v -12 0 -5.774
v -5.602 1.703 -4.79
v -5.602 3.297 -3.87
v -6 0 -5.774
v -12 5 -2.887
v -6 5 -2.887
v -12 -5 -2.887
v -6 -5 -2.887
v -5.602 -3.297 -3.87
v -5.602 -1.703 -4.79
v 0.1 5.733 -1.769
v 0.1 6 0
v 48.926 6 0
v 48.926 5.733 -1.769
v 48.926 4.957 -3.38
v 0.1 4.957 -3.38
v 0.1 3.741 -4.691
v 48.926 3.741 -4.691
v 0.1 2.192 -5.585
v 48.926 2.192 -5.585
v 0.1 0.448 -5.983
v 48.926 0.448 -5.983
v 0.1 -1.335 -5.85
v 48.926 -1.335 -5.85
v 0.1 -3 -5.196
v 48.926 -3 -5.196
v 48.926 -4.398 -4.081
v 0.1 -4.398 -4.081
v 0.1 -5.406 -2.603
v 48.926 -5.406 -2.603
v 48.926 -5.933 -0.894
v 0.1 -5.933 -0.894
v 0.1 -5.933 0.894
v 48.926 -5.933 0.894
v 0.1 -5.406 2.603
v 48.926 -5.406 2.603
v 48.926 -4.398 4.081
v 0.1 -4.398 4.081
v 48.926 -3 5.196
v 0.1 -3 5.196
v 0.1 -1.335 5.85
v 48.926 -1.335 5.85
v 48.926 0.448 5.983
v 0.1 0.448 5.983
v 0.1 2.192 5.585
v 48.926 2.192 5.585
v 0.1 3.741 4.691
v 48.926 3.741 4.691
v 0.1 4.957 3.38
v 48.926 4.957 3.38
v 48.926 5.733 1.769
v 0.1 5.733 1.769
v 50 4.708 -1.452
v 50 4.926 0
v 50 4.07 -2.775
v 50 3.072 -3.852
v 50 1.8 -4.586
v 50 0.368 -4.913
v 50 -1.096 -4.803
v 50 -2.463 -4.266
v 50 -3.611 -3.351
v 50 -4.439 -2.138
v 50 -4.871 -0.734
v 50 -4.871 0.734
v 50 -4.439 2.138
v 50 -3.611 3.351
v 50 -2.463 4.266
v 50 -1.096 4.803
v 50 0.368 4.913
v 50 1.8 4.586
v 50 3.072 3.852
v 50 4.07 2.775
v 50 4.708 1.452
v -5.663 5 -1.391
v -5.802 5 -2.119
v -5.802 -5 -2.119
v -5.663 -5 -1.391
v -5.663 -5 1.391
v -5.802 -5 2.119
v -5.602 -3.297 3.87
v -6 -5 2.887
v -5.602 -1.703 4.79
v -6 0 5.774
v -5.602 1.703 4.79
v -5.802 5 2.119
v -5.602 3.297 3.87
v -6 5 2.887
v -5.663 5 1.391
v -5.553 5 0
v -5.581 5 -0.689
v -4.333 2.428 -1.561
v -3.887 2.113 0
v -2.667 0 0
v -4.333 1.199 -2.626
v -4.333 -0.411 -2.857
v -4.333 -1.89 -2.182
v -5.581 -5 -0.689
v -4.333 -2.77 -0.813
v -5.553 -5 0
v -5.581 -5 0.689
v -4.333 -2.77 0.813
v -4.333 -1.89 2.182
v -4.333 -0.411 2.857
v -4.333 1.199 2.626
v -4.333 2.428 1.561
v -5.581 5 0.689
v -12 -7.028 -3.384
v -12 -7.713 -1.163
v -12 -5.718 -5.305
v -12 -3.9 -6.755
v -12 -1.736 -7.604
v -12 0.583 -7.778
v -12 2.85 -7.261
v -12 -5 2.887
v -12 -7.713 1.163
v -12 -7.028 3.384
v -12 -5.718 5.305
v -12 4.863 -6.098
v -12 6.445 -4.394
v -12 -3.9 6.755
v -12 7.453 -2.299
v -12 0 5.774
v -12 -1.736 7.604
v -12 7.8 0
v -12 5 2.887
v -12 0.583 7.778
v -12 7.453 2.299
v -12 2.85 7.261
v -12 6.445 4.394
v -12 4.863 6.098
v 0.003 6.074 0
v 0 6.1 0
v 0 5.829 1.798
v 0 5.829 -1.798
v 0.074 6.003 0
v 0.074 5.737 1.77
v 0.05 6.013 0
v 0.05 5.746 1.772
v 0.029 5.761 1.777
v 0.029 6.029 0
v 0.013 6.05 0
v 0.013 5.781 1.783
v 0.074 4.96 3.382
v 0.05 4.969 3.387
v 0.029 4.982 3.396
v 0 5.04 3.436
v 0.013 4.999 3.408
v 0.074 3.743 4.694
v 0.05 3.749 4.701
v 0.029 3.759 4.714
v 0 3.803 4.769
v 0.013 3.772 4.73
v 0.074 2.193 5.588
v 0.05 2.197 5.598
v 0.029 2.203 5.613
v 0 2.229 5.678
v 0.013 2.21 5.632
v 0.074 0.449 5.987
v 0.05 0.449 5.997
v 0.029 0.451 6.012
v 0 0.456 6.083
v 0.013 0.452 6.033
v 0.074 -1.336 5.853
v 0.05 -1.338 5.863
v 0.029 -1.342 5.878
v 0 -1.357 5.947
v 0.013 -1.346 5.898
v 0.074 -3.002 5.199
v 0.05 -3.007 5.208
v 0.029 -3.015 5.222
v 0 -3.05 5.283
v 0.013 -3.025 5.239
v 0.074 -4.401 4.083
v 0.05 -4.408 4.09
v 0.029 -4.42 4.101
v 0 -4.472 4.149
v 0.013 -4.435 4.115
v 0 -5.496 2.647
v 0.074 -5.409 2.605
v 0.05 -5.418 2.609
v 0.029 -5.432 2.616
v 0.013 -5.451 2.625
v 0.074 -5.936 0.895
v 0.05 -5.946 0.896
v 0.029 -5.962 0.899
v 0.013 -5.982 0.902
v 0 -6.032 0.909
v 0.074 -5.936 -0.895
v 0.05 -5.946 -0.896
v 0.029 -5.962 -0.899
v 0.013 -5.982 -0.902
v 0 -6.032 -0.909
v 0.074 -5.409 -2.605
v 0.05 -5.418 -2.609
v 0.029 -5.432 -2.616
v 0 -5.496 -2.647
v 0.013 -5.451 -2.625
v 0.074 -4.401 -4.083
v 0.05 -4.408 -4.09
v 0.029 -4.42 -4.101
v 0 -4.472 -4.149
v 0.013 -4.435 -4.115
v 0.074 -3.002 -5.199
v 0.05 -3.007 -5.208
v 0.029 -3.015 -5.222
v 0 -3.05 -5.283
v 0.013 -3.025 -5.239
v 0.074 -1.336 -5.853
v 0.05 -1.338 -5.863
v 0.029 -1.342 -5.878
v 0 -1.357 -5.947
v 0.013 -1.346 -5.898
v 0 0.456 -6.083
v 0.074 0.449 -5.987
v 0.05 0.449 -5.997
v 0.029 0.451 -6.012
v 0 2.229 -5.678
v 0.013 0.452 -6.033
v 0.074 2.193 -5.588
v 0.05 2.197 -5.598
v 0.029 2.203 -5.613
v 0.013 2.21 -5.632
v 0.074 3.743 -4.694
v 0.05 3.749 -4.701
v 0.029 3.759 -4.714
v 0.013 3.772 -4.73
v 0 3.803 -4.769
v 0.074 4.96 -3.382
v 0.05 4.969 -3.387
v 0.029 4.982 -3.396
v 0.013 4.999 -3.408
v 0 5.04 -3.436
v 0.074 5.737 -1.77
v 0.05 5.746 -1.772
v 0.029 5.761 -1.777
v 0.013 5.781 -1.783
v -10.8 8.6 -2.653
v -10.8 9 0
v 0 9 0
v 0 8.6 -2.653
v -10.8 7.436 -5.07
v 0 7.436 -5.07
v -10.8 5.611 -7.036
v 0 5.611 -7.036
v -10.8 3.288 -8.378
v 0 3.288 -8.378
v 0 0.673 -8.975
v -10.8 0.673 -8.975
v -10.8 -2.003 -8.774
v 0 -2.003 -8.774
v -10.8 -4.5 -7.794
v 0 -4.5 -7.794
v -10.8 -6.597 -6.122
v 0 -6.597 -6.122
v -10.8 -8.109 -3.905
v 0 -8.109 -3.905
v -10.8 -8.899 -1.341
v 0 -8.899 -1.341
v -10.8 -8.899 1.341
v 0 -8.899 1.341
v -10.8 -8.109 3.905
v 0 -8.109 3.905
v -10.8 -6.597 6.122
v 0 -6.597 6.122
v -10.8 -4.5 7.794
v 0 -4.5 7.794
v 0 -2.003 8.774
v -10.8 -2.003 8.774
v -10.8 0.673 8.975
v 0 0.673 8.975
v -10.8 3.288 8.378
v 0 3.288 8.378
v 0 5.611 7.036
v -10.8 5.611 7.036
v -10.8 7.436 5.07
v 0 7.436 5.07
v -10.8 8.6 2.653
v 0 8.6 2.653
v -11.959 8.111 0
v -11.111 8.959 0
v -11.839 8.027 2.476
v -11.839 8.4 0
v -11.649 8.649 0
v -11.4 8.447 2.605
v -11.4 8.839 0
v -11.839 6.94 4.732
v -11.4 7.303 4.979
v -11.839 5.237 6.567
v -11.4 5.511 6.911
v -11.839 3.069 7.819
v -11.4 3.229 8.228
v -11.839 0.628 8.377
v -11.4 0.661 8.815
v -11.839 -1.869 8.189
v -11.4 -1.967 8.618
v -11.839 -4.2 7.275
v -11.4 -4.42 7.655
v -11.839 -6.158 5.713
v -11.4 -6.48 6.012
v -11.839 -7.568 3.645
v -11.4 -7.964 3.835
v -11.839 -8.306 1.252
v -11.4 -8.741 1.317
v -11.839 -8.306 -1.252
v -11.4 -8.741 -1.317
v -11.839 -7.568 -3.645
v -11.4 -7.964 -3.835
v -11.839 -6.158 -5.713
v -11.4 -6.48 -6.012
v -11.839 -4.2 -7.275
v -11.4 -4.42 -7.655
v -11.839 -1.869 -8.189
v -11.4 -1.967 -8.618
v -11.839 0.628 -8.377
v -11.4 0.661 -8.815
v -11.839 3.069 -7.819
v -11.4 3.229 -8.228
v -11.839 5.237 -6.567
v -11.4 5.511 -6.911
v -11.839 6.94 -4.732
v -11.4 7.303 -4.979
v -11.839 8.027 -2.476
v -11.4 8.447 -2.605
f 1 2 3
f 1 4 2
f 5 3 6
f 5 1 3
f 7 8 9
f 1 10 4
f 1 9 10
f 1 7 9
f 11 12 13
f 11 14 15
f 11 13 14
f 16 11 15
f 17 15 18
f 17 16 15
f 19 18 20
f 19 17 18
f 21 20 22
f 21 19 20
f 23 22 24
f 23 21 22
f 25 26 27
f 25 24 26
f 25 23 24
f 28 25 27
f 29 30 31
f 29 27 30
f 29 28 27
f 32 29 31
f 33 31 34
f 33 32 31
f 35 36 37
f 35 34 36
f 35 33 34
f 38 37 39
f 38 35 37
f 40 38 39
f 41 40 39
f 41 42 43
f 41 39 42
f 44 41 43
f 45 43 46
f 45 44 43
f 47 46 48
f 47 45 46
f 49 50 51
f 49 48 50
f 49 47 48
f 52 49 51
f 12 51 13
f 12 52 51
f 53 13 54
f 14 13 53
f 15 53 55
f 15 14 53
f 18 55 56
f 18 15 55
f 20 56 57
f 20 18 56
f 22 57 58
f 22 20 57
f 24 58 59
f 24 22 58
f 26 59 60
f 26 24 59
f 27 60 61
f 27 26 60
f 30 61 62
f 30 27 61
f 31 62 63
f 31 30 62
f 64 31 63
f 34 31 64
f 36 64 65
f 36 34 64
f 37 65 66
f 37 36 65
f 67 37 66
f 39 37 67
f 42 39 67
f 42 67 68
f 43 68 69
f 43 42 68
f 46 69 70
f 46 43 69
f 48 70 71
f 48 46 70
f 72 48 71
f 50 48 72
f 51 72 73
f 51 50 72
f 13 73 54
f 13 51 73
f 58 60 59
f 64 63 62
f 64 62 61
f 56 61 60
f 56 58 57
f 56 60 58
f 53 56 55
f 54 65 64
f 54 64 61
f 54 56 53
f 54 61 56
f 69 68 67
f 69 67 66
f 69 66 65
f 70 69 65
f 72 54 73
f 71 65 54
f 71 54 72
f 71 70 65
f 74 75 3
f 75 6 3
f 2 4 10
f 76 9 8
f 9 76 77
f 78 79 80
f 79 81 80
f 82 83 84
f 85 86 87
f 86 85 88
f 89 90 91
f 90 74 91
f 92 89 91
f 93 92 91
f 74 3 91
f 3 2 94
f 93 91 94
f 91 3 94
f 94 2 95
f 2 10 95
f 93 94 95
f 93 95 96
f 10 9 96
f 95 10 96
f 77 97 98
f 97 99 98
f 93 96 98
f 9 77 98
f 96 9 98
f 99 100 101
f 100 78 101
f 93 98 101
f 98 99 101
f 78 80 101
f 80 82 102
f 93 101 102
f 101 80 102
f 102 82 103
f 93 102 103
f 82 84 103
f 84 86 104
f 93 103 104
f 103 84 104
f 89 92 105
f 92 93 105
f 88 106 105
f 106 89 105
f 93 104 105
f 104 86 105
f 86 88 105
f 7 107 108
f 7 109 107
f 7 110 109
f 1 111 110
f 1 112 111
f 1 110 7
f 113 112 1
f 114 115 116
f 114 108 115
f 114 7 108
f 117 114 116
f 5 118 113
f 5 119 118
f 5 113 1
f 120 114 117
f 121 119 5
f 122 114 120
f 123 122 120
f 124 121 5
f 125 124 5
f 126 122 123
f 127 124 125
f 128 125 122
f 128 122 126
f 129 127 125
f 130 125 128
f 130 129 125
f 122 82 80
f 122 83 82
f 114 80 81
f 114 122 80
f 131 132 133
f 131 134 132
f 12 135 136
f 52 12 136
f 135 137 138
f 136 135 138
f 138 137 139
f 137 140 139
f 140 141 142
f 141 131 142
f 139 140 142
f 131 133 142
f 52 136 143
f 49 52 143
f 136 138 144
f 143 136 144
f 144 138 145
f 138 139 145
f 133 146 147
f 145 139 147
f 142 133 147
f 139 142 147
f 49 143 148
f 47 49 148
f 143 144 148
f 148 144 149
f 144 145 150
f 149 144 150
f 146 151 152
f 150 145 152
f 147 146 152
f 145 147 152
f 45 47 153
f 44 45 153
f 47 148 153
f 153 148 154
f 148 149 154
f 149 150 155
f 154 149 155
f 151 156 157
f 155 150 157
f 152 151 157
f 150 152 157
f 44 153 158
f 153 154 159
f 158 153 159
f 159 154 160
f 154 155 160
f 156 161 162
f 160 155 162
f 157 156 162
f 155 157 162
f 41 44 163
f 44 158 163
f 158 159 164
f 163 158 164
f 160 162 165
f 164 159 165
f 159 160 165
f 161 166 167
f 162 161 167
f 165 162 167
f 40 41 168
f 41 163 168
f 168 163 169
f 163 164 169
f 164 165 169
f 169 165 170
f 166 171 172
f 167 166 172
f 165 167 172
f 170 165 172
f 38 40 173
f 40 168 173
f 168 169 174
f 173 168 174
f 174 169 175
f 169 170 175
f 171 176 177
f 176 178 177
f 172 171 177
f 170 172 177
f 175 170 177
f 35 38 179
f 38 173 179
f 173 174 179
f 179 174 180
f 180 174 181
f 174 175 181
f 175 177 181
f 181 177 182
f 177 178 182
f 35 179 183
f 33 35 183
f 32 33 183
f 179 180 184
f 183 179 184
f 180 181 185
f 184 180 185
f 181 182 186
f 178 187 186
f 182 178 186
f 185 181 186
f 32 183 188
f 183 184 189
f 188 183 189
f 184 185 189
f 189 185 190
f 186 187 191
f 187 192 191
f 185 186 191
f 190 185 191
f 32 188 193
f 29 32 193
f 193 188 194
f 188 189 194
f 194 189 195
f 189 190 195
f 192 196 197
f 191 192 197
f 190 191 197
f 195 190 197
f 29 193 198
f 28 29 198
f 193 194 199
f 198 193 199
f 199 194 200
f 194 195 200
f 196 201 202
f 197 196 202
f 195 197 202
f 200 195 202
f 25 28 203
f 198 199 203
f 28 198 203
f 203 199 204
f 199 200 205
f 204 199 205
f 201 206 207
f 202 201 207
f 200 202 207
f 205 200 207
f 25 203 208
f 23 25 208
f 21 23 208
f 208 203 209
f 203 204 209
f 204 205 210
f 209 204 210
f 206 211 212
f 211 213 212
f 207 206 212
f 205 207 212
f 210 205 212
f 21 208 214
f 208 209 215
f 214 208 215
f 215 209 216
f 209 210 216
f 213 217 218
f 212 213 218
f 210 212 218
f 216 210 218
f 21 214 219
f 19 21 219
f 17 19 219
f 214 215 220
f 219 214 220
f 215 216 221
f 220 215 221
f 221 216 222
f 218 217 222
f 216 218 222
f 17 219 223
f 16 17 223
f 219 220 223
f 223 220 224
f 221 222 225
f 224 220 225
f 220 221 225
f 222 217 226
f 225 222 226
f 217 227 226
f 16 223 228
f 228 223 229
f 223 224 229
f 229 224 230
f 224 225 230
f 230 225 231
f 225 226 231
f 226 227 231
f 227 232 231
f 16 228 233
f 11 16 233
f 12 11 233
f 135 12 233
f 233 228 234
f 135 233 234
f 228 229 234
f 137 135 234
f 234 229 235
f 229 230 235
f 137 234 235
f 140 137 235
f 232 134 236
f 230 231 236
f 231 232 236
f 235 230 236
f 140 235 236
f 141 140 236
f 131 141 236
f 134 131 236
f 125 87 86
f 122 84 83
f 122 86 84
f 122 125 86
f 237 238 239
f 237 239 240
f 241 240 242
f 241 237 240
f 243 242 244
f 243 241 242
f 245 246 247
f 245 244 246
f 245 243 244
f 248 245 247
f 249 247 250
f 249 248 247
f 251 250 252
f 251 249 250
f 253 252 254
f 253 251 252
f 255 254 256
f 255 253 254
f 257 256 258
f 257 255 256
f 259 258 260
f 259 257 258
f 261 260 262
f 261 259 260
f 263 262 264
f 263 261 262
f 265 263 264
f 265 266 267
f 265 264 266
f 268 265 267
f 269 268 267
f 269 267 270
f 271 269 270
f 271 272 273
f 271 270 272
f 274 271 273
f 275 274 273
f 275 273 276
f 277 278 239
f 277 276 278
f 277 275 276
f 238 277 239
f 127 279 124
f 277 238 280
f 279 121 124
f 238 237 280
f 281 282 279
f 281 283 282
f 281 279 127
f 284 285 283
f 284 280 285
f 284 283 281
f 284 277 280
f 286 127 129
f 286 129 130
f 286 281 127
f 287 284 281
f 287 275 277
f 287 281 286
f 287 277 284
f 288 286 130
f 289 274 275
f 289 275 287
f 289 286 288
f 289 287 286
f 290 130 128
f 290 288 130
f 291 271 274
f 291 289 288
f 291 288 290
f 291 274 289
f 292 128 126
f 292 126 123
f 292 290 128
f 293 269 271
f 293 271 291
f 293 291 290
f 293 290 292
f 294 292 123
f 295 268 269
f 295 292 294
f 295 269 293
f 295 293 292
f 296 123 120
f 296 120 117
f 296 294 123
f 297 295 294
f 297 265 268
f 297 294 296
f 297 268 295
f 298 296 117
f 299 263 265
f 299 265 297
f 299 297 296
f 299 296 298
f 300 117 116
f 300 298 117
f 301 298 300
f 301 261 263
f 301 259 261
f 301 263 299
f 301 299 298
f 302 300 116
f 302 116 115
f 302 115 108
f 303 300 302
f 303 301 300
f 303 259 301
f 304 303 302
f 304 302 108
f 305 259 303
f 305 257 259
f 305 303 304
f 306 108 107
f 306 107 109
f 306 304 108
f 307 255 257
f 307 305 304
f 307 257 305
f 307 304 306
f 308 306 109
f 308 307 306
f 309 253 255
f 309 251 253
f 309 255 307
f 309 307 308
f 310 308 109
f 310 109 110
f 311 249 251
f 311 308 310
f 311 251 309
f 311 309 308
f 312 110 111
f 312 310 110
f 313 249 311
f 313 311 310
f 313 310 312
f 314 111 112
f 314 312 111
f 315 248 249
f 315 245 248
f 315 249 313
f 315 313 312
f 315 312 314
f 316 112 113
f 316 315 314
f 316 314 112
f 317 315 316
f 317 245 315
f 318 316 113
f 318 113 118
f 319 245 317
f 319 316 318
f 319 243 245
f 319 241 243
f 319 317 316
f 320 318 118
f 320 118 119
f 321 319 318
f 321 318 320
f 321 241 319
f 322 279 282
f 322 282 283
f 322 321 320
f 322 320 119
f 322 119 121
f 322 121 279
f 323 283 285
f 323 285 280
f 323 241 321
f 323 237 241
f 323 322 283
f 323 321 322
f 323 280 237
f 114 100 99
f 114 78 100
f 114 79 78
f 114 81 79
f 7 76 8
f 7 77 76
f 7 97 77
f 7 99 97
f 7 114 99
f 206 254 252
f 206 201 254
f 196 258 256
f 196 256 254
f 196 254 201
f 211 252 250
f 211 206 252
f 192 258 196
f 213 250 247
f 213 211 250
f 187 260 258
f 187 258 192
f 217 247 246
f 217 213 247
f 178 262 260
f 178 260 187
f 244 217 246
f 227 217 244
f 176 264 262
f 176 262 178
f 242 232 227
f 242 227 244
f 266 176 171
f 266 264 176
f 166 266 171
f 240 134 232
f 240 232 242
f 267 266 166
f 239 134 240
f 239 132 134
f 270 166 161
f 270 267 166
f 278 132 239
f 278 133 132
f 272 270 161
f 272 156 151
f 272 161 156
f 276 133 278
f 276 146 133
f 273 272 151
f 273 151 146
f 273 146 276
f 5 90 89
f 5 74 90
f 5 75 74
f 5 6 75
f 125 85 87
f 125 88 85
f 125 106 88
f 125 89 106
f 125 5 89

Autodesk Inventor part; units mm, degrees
ref_plane "YZ Plane" through (0, 0, 0) normal (1, 0, 0) x (0, 1, 0)
ref_plane "XZ Plane" through (0, 0, 0) normal (0, 1, 0) x (-1, 0, 0)
sketch "Skizze1" plane through (0, 0, 0) normal (0, 0, 1) x (1, 0, 0)
  line L0 (-2.6667, 0) -> (50, 0)
  line L1 (50, 0) -> (50, 6)
  line L2 (50, 6) -> (4.375, 6)
  line L3 (4.375, 6) -> (3.3014, 6)
  line L4 (3.3014, 6) -> (0, 6)
  line L5 (0, 6) -> (0, 9)
  line L6 (0, 9) -> (-12, 9)
  line L7 (-12, 9) -> (-12, 5.7735)
  line L8 (-12, 5.7735) -> (-6, 5.7735)
  line L9 (-6, 5.7735) -> (-2.6667, 0)
  line L10 (-24.4, 0) -> (62.4, 0) projected
  line L11 (0, -1.8) -> (0, 10.8) projected
  line L12 (4.375, 6) -> (0, 6) construction
  dimension "d1" = 45.625
  dimension "d2" = 1.0736
  dimension "d3" = 12
  dimension "d4" = 6
  dimension "d5" = 60
  dimension "d6" = 12
  dimension "d7" = 12
  dimension "d8" = 11.547
  dimension "d9" = 18
  dimension "d26" = 50
revolve "Körper" add sketch "Skizze1" angle 360 about axis through (-2.6667, 0, 0) along (1, 0, 0)
sketch "Skizze2" plane through (-12, 0, 0) normal (-1, 0, 0) x (0, 0, 1)
  circle A0 centre (0, 0) radius 5.7735 projected
  line L0 (0, -12.6) -> (0, 12.6) projected
  line L1 (-12.6, 0) -> (12.6, 0) projected
  line L2 (5.7735, 0) -> (2.8868, -5)
  line L3 (2.8868, -5) -> (-2.8868, -5)
  line L4 (-2.8868, -5) -> (-5.7735, 0)
  line L5 (-5.7735, 0) -> (-2.8868, 5)
  line L6 (-2.8868, 5) -> (2.8868, 5)
  line L7 (2.8868, 5) -> (5.7735, 0)
extrude "Loch" add sketch "Skizze2" against normal up to next contours L7 A0 | A0 L2 | L6 L0 A0 | A0 L0 L3 | L0 L6 A0 | A0 L3 L0 | L4 A0 | A0 L5
fillet "Rundung1" radius 1.2 1 edges at (-12, -9, 0)
thread "Gewinde" size "M12x1.75" class "6g" standard "ISO Metric profile" length 45.625
chamfer "Fase1" distance 1.0735 distance2 1.0735 1 edges at (50, -6, 0) measured on face at (50, 1.5551, -0.8476)
ref_plane "Work Plane1" through (29, 0, 0) normal (0, -1, 0) x (1, 0, 0)
fillet "Fillet2" radius 0.1 1 edges at (0, -6, 0)
equation "\"d1\" = GEL"
equation "\"d3\" = KOH"
equation "\"d4\" = INTI"
equation "\"d6\" = GD"
equation "\"d7\" = BDM"
equation "\"d8\" = 1.1547 * SW"
equation "\"d9\" = KOD"
equation "\"d26\" = NLG"
equation "\"d30\" = R"
equation "\"d17\" = RR"
equation "\"d13\" = GEL"
equation "\"d15\" = -0.5 * SPD + 0.5 * GD"
equation "\"d16\" = GUL"
equation "\"GD\" = 12"
equation "\"NLG\" = 50"
equation "\"GEL\" = 45.625"
equation "\"KOD\" = 18"
equation "\"KOH\" = 12"
equation "\"INTI\" = 6"
equation "\"GAL\" = 0.61345 * PTC"
equation "\"GUL\" = 0.61345 * PTC"
equation "\"BDM\" = NND"
equation "\"RR\" = 1.2"
equation "\"SPD\" = NND - 1.2269 * PTC"
equation "\"R\" = 0.1"
equation "\"TOA\" = 30deg"
equation "\"GD1\" = THREADDIA - 1.2269 * PTC"
equation "\"THREADDIA\" = 12"
equation "\"FAWI\" = 45deg"
equation "\"PTC\" = 1.75"
equation "\"NND\" = 12"
equation "\"E0\" = 1.155 * SW"
equation "\"SW\" = 10"
properties part number "ISO 4762 - M12 x 50" material "Edelstahl, 440C"
